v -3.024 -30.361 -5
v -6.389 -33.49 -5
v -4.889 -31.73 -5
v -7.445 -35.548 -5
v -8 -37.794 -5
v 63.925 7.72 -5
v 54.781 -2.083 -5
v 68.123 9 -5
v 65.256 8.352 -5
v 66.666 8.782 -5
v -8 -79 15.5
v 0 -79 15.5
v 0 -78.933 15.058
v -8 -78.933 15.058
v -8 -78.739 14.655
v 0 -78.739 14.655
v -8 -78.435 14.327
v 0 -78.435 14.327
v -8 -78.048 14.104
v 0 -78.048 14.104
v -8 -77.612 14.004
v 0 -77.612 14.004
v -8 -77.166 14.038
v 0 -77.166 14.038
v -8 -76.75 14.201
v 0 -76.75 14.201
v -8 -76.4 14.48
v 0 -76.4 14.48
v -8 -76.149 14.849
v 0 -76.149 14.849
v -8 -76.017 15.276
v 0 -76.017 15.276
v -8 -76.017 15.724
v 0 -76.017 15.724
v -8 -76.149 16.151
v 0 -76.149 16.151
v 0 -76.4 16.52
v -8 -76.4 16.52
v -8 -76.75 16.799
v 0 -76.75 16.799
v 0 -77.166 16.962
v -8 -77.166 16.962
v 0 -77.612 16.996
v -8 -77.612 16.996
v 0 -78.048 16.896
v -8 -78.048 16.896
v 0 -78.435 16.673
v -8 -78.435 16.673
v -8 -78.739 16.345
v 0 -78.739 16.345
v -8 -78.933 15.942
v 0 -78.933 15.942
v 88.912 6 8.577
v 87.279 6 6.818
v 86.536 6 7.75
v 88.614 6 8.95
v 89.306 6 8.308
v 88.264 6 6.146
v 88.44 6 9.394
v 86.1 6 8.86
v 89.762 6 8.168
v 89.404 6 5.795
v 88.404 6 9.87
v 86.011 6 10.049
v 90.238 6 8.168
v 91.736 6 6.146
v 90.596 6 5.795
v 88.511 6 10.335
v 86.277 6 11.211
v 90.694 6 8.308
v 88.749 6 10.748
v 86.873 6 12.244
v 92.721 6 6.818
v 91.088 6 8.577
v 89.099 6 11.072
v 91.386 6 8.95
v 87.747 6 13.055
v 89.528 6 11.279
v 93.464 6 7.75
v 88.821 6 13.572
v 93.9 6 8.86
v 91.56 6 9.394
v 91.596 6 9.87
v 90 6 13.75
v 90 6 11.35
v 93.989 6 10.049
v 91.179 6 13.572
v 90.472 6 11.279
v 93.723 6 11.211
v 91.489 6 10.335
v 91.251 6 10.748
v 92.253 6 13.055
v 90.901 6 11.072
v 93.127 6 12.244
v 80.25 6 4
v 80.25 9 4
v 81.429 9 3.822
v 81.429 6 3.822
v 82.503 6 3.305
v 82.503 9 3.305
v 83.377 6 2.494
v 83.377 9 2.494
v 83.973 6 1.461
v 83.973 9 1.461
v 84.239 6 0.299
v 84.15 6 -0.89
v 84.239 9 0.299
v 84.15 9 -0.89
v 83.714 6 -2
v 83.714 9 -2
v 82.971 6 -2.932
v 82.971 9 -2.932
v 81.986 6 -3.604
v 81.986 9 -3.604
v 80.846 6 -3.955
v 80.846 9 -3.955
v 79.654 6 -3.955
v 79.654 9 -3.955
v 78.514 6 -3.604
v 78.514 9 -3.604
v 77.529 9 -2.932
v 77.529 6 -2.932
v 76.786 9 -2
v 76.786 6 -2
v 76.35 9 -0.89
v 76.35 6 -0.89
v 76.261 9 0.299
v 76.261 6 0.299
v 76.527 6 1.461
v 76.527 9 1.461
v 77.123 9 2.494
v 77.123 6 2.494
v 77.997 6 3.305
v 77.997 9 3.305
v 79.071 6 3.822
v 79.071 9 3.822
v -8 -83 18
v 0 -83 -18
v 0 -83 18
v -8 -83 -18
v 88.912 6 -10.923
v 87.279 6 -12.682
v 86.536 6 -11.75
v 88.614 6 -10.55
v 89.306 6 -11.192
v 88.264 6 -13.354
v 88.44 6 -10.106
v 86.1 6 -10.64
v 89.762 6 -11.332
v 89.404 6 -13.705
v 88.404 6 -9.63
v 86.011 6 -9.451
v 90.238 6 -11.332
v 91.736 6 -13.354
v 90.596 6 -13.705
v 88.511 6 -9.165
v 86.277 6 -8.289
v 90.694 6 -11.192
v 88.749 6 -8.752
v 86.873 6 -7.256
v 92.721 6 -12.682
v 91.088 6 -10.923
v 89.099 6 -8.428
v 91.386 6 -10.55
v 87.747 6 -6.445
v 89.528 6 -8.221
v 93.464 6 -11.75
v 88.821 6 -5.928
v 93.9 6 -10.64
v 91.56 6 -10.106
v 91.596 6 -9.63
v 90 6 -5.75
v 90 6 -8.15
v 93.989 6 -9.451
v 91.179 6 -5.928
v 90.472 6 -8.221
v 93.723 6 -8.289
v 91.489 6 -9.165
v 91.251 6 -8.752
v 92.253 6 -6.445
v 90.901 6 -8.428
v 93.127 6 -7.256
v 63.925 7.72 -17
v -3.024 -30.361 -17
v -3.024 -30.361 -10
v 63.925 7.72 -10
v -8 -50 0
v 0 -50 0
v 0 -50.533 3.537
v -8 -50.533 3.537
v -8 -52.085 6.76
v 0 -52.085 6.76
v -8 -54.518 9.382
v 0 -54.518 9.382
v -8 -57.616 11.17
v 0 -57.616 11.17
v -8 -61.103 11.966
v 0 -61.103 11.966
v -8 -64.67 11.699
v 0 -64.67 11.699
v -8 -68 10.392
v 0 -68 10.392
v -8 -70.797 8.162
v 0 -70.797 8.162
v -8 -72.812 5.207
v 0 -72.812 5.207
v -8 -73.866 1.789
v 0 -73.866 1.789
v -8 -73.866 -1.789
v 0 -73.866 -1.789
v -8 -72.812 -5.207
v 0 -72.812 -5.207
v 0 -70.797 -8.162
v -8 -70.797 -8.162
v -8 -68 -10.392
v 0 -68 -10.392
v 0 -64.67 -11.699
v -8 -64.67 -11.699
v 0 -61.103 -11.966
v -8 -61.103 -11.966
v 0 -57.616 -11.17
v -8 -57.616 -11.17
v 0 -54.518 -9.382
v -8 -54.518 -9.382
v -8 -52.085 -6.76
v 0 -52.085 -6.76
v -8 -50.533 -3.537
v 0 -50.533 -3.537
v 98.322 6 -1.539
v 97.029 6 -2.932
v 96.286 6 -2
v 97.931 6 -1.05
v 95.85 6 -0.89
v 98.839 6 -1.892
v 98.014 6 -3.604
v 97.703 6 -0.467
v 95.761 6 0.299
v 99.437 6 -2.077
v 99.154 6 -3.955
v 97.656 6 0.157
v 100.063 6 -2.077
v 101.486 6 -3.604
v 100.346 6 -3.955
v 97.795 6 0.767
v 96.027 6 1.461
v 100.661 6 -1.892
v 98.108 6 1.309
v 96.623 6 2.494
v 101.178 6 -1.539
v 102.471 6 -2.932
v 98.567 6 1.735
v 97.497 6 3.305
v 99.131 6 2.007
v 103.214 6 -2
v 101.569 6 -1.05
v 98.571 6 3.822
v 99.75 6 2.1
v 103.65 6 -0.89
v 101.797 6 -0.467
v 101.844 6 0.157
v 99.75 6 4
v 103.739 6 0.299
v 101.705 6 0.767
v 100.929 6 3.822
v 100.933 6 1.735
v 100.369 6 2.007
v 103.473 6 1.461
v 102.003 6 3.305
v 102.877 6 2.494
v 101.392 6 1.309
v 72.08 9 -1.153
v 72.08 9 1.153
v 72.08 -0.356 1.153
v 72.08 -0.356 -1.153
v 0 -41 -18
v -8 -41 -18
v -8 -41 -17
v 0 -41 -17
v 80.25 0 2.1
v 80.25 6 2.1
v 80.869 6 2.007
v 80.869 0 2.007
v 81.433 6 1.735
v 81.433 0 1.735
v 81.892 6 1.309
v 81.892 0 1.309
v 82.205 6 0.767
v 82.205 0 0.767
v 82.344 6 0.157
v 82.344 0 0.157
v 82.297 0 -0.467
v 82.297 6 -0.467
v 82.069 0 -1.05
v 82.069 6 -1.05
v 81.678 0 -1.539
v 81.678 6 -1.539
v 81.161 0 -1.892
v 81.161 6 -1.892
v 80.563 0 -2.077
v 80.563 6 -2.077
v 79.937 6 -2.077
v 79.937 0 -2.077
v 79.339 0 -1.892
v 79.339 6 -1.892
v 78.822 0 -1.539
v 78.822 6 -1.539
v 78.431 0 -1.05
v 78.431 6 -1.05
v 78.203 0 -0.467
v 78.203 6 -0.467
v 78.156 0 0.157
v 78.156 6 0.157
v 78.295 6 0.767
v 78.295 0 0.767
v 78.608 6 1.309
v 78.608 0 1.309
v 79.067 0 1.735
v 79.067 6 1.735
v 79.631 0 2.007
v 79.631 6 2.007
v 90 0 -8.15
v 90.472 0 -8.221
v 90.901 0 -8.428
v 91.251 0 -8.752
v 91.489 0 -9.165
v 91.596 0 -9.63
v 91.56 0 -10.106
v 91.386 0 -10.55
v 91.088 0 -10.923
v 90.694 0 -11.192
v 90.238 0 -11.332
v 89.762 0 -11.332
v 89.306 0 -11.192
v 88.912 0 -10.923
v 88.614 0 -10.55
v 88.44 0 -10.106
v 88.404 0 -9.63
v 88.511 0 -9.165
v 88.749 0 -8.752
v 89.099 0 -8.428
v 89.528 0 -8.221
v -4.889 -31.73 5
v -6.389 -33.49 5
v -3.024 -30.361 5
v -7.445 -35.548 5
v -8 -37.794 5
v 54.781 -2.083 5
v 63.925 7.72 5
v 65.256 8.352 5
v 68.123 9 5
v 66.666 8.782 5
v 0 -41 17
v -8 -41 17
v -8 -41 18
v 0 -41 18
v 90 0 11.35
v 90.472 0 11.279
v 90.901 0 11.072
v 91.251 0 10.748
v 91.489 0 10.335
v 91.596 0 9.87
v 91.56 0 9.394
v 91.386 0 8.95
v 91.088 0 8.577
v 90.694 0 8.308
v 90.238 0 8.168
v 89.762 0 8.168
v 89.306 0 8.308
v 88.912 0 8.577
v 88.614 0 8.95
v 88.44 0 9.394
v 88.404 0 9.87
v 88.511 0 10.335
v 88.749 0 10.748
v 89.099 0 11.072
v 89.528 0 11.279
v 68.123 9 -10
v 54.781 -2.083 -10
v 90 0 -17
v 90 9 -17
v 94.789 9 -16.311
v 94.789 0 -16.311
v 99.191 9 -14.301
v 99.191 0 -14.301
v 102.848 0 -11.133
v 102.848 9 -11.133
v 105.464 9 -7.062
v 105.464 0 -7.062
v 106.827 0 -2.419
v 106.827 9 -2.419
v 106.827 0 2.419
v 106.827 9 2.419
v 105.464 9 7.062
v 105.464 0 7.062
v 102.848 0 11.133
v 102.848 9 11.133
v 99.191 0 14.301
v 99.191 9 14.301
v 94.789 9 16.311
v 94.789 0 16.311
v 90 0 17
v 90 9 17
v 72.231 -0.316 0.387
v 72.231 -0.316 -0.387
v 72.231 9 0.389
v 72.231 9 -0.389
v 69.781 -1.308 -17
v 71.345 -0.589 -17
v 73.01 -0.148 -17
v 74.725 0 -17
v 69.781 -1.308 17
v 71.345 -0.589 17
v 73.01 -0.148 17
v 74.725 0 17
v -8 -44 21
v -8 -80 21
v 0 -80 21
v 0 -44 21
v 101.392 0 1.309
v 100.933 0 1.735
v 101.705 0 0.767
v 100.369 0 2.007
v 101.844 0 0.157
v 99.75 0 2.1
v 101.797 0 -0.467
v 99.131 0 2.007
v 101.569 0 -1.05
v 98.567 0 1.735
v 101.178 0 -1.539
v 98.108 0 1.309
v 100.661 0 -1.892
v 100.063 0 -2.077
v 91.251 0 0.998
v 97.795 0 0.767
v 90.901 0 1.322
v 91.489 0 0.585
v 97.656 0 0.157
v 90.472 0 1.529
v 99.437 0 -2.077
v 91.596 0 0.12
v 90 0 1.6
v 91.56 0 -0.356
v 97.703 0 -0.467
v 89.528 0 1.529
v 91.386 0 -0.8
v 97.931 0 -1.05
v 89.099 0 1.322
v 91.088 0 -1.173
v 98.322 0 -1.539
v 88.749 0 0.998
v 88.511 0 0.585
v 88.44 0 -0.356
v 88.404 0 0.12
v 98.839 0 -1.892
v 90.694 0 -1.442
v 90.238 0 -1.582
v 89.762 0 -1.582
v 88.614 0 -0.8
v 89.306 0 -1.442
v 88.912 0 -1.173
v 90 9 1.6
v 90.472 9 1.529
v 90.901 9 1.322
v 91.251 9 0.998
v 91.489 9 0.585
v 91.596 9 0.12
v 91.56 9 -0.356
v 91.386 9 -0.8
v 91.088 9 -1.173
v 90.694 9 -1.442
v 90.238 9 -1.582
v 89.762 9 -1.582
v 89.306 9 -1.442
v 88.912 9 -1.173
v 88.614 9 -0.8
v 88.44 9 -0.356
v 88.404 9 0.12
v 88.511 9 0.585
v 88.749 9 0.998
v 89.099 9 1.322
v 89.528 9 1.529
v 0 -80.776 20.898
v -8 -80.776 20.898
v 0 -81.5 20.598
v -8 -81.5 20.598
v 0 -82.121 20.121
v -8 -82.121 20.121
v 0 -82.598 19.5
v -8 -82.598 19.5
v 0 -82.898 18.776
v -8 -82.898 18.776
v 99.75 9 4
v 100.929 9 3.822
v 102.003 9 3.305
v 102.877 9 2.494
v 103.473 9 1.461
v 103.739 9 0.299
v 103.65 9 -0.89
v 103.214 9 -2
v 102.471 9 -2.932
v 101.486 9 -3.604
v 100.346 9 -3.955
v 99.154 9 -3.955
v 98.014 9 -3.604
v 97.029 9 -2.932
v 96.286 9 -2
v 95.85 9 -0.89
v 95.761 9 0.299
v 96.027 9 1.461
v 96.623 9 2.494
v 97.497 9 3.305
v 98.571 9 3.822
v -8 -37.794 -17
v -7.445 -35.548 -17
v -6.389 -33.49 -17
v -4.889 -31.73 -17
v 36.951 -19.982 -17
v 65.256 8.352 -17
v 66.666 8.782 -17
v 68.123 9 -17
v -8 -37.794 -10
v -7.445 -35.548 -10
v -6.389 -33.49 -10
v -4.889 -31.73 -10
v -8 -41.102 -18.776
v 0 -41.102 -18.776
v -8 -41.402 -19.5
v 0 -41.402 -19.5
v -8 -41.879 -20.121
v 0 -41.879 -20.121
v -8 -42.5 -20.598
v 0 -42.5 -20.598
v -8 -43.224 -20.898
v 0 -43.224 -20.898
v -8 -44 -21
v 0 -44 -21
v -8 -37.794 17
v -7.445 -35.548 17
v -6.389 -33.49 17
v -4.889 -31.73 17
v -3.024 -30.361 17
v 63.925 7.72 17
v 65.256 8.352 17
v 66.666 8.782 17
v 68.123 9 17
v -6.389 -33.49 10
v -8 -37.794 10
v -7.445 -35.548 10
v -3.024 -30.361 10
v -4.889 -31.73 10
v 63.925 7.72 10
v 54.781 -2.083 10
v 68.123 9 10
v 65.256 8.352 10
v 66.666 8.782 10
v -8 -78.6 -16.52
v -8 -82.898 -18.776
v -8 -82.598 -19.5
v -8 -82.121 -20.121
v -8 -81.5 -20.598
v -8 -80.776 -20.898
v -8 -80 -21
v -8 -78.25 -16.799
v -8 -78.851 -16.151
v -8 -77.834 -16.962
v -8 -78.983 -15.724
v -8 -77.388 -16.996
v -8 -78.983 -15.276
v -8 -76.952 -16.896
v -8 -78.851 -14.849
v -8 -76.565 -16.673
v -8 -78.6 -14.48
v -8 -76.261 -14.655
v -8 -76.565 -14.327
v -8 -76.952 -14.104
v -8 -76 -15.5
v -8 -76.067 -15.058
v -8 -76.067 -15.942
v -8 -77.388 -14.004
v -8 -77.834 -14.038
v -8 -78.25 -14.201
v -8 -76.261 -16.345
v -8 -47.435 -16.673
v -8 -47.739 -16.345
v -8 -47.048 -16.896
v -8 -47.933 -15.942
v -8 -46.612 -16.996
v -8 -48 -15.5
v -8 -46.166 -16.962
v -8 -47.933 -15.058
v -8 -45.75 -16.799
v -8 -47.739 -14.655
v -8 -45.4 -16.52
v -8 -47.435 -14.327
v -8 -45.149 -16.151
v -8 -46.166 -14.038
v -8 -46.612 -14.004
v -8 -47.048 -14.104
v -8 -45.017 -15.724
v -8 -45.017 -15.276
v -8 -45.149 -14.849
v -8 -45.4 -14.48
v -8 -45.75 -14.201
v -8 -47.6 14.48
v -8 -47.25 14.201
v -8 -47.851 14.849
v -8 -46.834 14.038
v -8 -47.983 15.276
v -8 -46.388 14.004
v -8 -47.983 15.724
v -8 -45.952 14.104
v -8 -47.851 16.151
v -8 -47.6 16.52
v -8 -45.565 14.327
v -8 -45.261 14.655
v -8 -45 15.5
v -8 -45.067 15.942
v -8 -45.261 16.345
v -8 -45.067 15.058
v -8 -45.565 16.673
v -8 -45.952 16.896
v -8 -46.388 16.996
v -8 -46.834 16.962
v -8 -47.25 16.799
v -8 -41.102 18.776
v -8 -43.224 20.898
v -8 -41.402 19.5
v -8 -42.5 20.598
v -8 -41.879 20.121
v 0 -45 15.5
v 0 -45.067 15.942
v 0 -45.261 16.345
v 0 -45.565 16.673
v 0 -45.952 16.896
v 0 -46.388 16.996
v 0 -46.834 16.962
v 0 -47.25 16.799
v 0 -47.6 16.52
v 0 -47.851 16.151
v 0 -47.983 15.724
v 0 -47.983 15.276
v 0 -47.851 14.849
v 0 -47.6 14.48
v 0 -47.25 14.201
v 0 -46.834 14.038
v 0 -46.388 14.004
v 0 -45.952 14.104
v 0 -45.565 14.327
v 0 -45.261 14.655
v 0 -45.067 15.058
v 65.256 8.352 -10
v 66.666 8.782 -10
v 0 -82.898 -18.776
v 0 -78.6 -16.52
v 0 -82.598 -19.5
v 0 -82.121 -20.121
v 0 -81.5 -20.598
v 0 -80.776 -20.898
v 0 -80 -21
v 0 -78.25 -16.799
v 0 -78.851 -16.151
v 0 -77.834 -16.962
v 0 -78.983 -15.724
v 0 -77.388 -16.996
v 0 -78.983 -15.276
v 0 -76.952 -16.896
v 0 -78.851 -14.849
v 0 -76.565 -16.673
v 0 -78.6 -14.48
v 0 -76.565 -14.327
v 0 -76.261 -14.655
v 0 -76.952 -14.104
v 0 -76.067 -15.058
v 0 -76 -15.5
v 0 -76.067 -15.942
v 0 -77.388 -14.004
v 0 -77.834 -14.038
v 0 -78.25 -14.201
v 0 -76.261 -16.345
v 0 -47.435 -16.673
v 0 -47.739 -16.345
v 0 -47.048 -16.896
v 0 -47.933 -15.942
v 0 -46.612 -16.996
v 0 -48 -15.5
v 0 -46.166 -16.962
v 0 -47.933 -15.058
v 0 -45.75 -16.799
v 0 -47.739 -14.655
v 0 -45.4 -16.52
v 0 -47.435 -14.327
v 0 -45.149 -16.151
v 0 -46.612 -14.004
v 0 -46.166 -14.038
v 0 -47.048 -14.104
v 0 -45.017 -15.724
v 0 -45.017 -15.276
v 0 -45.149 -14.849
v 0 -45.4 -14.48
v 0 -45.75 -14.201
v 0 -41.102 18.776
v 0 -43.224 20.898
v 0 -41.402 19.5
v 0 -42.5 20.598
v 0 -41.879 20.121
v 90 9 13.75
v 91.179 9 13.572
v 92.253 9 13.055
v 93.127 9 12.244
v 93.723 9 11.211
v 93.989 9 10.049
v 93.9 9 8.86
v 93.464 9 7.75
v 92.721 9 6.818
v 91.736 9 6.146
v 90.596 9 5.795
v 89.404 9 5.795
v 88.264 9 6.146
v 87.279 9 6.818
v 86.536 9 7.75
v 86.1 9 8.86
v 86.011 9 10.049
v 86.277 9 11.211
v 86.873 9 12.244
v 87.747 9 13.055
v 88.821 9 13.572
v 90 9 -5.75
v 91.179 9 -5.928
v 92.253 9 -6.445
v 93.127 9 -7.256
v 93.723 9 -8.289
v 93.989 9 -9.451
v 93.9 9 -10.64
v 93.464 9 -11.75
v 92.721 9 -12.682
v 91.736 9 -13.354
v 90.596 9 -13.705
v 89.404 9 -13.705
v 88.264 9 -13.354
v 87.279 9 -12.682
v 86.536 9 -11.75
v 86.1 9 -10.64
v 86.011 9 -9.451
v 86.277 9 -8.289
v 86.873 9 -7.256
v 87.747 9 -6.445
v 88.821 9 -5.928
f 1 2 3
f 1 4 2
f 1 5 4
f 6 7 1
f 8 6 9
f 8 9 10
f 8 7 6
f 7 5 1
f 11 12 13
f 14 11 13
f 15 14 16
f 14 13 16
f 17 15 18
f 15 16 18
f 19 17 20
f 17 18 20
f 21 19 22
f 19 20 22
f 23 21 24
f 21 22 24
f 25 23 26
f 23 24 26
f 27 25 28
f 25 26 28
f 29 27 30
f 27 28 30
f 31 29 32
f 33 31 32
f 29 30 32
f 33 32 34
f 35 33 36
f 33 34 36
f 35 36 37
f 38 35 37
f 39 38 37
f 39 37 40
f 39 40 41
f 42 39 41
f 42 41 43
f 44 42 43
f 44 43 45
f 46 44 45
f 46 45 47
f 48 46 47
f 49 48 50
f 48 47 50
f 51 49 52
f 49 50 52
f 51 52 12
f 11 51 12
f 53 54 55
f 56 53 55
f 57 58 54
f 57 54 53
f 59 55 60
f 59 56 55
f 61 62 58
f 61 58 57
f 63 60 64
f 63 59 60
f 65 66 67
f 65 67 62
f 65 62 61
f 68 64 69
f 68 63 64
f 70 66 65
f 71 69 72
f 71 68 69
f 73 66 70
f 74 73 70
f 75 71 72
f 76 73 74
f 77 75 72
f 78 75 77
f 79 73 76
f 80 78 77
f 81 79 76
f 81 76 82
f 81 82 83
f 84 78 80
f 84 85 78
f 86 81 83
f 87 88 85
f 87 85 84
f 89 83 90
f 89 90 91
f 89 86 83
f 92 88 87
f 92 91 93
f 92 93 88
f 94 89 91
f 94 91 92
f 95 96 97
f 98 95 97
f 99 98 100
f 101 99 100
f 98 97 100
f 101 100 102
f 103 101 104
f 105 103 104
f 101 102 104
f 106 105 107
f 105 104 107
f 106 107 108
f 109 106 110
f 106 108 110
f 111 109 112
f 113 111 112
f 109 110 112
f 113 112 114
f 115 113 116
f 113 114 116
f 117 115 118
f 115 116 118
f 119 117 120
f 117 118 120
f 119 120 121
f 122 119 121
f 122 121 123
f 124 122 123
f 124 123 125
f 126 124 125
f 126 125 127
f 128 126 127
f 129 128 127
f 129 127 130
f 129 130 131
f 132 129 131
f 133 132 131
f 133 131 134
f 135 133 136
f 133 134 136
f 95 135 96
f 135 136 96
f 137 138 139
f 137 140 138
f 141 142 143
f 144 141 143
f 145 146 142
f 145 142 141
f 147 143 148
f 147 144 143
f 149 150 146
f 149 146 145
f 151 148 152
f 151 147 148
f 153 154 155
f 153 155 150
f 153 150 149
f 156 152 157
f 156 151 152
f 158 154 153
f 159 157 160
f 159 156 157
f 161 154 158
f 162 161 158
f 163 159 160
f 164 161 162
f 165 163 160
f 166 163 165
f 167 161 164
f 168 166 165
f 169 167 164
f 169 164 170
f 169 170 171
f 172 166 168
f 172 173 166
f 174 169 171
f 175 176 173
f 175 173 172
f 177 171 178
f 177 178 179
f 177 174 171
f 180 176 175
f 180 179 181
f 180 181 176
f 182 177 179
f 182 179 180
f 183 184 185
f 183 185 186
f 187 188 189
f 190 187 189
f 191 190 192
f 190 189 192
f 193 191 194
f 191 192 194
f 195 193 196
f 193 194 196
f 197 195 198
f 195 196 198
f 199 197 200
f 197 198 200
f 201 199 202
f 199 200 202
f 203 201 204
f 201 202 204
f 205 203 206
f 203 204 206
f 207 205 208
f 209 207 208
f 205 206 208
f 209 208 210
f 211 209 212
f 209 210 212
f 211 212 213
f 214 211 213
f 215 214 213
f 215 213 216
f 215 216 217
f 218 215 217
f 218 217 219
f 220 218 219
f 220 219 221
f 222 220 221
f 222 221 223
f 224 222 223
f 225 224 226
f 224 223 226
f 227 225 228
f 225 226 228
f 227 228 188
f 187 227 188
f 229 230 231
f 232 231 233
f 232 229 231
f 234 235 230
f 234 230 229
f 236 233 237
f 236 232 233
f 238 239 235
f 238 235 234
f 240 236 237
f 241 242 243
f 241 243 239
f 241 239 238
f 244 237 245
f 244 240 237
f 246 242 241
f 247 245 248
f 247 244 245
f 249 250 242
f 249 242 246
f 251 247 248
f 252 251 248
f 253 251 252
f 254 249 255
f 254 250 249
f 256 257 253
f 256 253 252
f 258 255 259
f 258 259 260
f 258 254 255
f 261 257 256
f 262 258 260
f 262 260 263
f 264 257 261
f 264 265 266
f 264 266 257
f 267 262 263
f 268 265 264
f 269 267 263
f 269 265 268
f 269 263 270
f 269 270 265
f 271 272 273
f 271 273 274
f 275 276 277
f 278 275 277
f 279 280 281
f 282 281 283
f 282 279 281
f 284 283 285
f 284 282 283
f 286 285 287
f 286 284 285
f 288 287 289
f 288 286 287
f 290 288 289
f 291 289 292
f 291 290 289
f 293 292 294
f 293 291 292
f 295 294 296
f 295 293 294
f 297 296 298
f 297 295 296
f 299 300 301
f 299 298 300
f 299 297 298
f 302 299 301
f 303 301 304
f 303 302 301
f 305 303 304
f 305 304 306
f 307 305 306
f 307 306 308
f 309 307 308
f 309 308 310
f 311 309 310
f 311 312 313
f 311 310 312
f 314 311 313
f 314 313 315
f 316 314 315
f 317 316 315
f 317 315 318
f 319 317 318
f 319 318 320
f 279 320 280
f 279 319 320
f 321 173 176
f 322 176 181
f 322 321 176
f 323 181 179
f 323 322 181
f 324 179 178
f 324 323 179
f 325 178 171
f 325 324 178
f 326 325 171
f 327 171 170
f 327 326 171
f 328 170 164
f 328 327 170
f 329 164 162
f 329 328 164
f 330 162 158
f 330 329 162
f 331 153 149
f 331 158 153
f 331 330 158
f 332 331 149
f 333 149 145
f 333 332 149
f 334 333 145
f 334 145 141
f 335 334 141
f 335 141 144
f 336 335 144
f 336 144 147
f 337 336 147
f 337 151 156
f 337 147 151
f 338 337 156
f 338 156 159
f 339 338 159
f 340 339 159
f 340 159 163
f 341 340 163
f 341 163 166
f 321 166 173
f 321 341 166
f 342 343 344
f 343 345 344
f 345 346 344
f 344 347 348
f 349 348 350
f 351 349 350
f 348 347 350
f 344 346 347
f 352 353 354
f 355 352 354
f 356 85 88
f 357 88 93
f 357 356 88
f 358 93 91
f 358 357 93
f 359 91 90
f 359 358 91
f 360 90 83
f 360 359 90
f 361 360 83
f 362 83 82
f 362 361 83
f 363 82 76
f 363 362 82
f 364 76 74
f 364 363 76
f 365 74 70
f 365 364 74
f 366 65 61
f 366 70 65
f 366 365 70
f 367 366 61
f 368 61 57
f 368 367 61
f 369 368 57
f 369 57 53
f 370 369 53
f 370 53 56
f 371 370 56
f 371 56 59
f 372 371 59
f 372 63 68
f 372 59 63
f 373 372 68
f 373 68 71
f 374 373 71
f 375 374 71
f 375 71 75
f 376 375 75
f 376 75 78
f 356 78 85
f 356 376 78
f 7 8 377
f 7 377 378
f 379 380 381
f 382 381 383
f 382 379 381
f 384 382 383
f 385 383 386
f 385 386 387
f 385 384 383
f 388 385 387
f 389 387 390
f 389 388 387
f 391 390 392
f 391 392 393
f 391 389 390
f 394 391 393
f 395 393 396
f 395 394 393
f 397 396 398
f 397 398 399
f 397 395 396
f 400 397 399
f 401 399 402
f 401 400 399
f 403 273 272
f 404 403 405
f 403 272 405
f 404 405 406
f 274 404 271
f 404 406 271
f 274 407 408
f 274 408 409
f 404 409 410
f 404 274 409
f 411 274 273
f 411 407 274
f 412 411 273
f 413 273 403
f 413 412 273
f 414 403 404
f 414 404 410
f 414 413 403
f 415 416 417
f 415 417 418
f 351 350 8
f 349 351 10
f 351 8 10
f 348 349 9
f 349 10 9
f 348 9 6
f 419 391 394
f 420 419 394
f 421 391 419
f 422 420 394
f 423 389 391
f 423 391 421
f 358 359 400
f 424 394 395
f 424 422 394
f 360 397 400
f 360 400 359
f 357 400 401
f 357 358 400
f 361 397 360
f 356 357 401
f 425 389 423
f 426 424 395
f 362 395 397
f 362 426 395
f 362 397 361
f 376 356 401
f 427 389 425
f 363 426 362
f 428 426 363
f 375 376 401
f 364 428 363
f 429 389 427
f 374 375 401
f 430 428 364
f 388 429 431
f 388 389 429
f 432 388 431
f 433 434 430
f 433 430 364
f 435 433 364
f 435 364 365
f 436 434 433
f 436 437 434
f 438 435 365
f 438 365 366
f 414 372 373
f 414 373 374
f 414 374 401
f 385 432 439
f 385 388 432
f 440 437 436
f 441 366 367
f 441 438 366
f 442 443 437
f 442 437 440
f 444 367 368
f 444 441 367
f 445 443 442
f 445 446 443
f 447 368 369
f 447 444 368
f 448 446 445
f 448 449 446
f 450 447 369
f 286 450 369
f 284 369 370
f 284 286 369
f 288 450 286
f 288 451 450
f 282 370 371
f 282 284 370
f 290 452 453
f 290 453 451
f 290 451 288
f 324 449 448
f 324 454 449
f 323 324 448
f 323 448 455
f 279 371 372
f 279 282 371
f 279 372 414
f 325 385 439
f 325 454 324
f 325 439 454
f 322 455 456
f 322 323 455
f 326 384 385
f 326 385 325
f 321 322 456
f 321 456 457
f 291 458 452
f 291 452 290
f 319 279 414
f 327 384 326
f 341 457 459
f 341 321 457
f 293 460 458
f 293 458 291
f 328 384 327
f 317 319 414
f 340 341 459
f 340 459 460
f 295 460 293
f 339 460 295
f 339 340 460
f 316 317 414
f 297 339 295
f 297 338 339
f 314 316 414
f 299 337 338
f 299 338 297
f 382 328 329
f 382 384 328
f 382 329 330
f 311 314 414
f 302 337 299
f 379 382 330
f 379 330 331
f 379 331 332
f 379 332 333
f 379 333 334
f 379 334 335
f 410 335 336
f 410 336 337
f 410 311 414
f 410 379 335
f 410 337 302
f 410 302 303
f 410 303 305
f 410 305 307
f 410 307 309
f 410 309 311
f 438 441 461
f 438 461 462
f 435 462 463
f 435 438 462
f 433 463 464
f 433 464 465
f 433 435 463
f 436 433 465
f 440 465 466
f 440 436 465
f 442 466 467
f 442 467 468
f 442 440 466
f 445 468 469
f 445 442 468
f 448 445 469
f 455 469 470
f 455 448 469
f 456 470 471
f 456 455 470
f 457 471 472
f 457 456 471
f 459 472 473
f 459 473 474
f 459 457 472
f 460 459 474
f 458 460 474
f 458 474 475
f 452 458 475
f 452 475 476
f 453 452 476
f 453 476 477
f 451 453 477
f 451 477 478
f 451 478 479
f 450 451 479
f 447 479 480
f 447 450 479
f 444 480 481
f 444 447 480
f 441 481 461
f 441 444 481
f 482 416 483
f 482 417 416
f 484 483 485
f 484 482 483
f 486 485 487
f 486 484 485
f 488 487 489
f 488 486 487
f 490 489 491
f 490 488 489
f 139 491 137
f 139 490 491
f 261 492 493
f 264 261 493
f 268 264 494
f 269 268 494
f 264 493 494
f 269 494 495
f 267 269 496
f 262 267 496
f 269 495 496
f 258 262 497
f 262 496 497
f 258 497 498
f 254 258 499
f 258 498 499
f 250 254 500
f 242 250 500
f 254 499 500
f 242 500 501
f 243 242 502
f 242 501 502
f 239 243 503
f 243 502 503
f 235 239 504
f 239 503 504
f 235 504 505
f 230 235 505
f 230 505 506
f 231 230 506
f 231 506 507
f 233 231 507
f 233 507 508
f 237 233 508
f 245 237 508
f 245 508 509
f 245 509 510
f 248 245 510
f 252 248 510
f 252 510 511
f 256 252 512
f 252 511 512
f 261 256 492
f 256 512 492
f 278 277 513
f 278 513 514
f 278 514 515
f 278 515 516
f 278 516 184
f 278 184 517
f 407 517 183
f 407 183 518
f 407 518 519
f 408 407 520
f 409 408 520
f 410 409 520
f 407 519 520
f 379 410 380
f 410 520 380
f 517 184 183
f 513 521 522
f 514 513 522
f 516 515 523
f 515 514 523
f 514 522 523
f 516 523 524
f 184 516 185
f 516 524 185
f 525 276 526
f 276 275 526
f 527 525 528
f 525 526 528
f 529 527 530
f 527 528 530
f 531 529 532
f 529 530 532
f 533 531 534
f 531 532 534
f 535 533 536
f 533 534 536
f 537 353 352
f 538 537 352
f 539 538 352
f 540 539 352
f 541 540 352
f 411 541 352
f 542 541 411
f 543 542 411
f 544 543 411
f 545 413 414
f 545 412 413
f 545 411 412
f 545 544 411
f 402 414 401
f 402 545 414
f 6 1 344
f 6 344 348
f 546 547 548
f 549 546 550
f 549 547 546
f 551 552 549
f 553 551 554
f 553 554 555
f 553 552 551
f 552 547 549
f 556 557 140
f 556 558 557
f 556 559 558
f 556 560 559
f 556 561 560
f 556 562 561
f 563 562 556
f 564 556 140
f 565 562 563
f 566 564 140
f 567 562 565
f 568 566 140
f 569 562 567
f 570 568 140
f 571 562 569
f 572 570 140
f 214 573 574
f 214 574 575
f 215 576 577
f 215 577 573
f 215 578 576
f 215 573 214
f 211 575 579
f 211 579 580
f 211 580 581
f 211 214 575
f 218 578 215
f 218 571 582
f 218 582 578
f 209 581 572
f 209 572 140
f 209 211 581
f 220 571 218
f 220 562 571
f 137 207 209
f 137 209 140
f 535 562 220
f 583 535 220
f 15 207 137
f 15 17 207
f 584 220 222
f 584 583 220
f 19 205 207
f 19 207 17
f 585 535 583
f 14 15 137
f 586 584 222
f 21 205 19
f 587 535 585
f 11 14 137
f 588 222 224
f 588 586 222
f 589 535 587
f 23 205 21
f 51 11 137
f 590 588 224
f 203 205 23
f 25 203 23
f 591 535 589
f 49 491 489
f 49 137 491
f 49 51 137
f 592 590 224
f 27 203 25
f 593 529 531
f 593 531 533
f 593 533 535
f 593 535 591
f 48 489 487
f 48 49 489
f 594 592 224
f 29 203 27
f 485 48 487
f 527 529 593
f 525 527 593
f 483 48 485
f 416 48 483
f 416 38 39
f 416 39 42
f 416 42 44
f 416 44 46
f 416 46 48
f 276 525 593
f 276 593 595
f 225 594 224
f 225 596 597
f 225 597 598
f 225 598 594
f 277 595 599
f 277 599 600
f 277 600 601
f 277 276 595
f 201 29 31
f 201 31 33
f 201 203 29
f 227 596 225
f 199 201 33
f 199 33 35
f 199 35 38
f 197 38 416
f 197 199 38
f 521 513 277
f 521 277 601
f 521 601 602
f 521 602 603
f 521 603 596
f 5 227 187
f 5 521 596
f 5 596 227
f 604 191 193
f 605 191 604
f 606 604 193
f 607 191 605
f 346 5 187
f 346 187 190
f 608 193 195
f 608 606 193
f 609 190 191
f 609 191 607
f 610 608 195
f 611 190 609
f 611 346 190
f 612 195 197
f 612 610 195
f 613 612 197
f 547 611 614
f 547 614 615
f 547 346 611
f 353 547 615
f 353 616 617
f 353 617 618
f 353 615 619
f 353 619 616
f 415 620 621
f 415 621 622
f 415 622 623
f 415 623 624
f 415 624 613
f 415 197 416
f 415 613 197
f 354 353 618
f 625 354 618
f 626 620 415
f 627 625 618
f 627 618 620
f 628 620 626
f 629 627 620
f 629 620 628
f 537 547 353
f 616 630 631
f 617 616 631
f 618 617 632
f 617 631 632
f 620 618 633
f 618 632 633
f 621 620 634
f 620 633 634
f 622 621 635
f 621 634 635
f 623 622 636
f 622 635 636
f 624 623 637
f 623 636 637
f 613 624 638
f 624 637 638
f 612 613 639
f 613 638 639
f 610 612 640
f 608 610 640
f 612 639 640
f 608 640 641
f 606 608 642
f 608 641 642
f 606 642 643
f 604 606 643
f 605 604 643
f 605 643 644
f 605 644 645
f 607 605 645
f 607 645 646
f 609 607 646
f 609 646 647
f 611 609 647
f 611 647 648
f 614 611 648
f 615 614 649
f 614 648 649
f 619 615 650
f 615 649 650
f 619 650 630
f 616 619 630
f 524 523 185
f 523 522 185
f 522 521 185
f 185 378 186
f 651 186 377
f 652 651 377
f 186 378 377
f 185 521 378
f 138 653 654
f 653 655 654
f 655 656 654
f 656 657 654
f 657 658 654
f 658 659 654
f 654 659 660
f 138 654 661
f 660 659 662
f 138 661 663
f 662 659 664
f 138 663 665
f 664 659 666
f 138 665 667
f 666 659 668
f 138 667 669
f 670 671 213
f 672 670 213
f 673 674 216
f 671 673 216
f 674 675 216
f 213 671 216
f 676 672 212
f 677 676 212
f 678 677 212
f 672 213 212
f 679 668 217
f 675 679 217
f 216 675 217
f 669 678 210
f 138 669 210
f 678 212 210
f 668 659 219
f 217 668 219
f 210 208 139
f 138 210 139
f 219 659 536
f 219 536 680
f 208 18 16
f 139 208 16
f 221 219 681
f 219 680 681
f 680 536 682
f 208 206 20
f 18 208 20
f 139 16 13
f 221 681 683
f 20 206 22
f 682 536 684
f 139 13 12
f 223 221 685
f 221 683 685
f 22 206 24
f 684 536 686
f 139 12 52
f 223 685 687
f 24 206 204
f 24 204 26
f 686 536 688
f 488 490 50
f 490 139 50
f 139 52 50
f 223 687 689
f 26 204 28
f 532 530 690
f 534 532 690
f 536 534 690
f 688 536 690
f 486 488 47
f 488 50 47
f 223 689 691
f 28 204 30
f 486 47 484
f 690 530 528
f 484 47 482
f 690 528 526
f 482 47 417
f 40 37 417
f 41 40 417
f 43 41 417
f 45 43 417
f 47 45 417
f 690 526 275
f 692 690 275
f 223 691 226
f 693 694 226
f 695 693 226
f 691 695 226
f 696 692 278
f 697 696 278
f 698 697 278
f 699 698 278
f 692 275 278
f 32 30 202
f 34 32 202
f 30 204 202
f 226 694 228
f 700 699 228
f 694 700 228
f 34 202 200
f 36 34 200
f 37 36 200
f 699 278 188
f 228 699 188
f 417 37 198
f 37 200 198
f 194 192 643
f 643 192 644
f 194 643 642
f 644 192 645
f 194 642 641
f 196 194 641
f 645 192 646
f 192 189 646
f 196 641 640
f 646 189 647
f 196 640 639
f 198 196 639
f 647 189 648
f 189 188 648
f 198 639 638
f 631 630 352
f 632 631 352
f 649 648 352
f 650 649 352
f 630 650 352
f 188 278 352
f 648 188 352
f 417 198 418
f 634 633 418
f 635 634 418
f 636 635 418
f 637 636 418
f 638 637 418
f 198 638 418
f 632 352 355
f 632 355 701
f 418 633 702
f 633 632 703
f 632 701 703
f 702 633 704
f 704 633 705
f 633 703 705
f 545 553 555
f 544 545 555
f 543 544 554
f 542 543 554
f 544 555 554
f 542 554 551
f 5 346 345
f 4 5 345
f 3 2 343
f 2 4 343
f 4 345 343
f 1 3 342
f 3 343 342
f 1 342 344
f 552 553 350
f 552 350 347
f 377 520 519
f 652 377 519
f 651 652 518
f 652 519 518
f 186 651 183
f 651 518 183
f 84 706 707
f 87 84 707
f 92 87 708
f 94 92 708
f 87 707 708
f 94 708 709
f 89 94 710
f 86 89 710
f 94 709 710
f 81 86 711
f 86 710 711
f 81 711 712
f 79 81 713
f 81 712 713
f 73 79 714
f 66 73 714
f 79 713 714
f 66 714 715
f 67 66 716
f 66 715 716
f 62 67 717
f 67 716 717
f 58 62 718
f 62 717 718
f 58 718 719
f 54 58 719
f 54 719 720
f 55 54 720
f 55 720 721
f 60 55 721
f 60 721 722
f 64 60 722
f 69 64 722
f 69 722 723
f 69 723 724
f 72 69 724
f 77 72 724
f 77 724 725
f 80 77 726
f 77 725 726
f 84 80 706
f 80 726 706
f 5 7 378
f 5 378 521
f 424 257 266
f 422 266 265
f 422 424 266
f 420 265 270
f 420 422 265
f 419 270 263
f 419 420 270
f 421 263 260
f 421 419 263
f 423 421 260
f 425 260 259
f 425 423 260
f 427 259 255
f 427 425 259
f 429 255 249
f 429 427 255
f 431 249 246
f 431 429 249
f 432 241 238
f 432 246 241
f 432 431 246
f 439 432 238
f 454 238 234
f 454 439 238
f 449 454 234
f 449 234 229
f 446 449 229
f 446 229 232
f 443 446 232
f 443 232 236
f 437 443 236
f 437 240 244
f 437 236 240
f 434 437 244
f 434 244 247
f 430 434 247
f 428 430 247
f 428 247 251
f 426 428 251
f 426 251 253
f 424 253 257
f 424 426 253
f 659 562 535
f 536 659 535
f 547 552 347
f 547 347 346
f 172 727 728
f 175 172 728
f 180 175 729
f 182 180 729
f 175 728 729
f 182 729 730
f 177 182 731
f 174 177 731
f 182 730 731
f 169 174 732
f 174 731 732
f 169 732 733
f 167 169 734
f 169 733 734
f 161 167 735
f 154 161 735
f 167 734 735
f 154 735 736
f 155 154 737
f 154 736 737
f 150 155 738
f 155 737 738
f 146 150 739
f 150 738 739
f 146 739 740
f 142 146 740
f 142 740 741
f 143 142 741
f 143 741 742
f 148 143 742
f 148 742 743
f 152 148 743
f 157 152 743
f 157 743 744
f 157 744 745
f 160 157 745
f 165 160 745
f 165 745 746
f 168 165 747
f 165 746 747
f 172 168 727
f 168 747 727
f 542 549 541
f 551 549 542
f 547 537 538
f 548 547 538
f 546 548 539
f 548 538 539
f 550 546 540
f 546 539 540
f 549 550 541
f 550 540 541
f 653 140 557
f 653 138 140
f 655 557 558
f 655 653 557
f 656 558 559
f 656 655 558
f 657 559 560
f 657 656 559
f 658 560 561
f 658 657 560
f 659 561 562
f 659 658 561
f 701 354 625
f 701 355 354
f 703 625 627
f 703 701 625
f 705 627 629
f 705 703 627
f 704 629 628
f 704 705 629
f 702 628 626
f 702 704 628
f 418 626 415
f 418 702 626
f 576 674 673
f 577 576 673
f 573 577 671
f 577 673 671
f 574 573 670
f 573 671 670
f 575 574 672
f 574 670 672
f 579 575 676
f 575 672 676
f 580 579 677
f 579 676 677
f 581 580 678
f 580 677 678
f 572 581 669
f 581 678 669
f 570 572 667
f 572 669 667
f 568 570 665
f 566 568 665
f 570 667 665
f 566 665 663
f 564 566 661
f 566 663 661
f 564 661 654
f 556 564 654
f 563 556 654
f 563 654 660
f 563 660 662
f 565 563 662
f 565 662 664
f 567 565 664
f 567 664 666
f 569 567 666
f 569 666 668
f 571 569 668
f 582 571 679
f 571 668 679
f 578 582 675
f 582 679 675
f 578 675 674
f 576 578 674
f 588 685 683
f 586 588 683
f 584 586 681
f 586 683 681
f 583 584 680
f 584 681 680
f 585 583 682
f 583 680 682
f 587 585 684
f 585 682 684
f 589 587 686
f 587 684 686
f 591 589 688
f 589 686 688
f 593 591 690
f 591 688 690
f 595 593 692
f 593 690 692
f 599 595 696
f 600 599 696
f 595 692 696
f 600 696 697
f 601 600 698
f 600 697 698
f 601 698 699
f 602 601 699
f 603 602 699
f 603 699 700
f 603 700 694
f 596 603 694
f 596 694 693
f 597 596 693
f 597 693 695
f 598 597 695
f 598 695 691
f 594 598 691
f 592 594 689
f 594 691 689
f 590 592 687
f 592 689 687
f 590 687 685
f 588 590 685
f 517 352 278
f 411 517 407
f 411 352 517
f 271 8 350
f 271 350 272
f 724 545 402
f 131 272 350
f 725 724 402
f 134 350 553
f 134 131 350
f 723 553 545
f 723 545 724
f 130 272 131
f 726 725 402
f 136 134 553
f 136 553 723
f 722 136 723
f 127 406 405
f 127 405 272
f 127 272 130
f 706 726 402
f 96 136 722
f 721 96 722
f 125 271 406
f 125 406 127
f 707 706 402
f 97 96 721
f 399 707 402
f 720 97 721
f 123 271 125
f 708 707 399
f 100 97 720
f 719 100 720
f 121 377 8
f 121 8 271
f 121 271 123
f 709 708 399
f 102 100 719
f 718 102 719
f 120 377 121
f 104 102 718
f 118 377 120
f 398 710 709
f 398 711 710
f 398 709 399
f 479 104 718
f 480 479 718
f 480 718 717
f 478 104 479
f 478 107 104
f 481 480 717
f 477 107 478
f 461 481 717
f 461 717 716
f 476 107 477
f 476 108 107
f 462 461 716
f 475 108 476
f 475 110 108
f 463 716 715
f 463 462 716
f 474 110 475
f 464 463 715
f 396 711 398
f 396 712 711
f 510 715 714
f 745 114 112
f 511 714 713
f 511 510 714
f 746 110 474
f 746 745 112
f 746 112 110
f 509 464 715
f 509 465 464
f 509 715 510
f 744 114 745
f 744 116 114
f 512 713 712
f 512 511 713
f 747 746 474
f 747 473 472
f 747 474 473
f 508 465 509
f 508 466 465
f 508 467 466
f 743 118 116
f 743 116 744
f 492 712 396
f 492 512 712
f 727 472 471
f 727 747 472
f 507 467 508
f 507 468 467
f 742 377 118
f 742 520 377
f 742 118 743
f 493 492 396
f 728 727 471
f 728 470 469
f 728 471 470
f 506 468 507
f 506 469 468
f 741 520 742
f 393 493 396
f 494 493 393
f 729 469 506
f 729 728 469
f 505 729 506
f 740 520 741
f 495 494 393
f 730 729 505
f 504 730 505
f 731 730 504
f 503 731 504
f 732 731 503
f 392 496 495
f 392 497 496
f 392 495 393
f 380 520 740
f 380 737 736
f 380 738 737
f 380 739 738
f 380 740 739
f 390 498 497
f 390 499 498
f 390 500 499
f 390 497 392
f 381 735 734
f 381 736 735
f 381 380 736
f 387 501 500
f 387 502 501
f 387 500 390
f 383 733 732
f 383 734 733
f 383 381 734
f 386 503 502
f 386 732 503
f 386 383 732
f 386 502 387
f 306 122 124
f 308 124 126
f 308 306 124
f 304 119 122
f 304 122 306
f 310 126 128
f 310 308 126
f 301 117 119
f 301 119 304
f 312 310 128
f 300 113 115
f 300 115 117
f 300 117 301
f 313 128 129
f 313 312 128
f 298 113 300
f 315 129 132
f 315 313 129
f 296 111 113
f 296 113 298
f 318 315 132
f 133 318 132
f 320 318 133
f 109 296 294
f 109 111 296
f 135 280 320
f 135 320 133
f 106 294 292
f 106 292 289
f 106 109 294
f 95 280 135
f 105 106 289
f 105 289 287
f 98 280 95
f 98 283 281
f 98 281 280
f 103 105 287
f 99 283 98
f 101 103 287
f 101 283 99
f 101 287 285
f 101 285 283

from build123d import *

# Parameters (mm, degrees)
SKETCH_1_R           = 1.6
SKETCH_1_R_2         = 2.1
EXTRUDE_2_DEPTH      = 9
SKETCH_3_R           = 4
CUT_EXTRUDE_2_DEPTH  = 3
SKETCH_4_W           = 22.834782432
SKETCH_4_H           = 34.021608207
CUT_EXTRUDE_3_DEPTH  = 10
SKETCH_5_W           = 8
SKETCH_5_H           = 34
SKETCH_5_R           = 1.6
EXTRUDE_3_DEPTH      = 6
SKETCH_6_R           = 3.5
CUT_EXTRUDE_4_DEPTH  = 3
CUT_EXTRUDE_5_DEPTH  = 13
EXTRUDE_4_DEPTH      = 35
CUT_EXTRUDE_6_DEPTH  = 40
SKETCH_10_W          = 118.393769374
SKETCH_10_H          = 1
CUT_EXTRUDE_7_DEPTH  = 40
SKETCH_11_W          = 80.430163382
SKETCH_11_H          = 7.146133908
CUT_EXTRUDE_8_DEPTH  = 40
EXTRUDE_5_DEPTH      = 34
SKETCH_14_W          = 42
SKETCH_14_H          = 42
EXTRUDE_6_DEPTH      = 8
SKETCH_13_R          = 1.5
SKETCH_13_R_2        = 12
CUT_EXTRUDE_10_DEPTH = 8
SKETCH_15_W          = 89.303663432
SKETCH_15_H          = 7
SKETCH_15_H_2        = 10
EXTRUDE_7_DEPTH      = 4
FILLET_1_R           = 10
FILLET_2_R           = 10
FILLET_3_R           = 3


with BuildPart() as part:
    # 草图1 → 凸台-拉伸2 (new body)
    with BuildSketch(Plane(origin=(0, 0, 0), x_dir=(1, 0, 0), z_dir=(0, 1, 0))):
        with BuildLine():
            Line((0, 17), (90, 17))
            ThreePointArc((90, 17), (107, 0), (90, -17))
            Line((90, -17), (0, -17))
            ThreePointArc((0, -17), (-17, 0), (0, 17))
        make_face()
        with Locations(Location((90, 0, 0), (0, 0, 270))):
            Circle(SKETCH_1_R, mode=Mode.SUBTRACT)
        with Locations(Location((90, 9.75, 0), (0, 0, 270))):
            Circle(SKETCH_1_R, mode=Mode.SUBTRACT)
        with Locations(Location((99.75, 0, 0), (0, 0, 270))):
            Circle(SKETCH_1_R_2, mode=Mode.SUBTRACT)
        with Locations(Location((90, -9.75, 0), (0, 0, 270))):
            Circle(SKETCH_1_R, mode=Mode.SUBTRACT)
        with Locations(Location((80.25, 0, 0), (0, 0, 270))):
            Circle(SKETCH_1_R_2, mode=Mode.SUBTRACT)
    extrude(amount=EXTRUDE_2_DEPTH)

    # 草图3 → 切除-拉伸2 (cut)
    with BuildSketch(Plane(origin=(0, 9, 0), x_dir=(1, 0, 0), z_dir=(0, 1, 0))):
        with Locations(Location((90, 9.75, 0), (0, 0, 270))):
            Circle(SKETCH_3_R)
        with Locations(Location((99.75, 0, 0), (0, 0, 270))):
            Circle(SKETCH_3_R)
        with Locations(Location((90, -9.75, 0), (0, 0, 270))):
            Circle(SKETCH_3_R)
        with Locations(Location((80.25, 0, 0), (0, 0, 270))):
            Circle(SKETCH_3_R)
    extrude(amount=-CUT_EXTRUDE_2_DEPTH, mode=Mode.SUBTRACT)

    # 草图4 → 切除-拉伸3 (cut)
    with BuildSketch(Plane(origin=(0, 9, 0), x_dir=(1, 0, 0), z_dir=(0, 1, 0))):
        with Locations((-11.417391216, 0.010804103)):
            Rectangle(SKETCH_4_W, SKETCH_4_H)
    extrude(amount=-CUT_EXTRUDE_3_DEPTH, mode=Mode.SUBTRACT)

    # 草图5 → 凸台-拉伸3 (add)
    with BuildSketch(Plane(origin=(0, 9, 0), x_dir=(1, 0, 0), z_dir=(0, 1, 0))):
        with Locations((-4, 0)):
            Rectangle(SKETCH_5_W, SKETCH_5_H)
        with Locations(Location((-4, 10, 0), (0, 0, 270))):
            Circle(SKETCH_5_R, mode=Mode.SUBTRACT)
        with Locations(Location((-4, 0, 0), (0, 0, 270))):
            Circle(SKETCH_5_R, mode=Mode.SUBTRACT)
        with Locations(Location((-4, -10, 0), (0, 0, 270))):
            Circle(SKETCH_5_R, mode=Mode.SUBTRACT)
    extrude(amount=-EXTRUDE_3_DEPTH)

    # 草图6 → 切除-拉伸4 (cut)
    with BuildSketch(Plane(origin=(0, 9, 0), x_dir=(1, 0, 0), z_dir=(0, 1, 0))):
        with Locations(Location((-4, 10, 0), (0, 0, 270))):
            Circle(SKETCH_6_R)
        with Locations(Location((-4, 0, 0), (0, 0, 270))):
            Circle(SKETCH_6_R)
        with Locations(Location((-4, -10, 0), (0, 0, 270))):
            Circle(SKETCH_6_R)
    extrude(amount=-CUT_EXTRUDE_4_DEPTH, mode=Mode.SUBTRACT)

    # 草图7 → 切除-拉伸5 (cut)
    with BuildSketch(Plane(origin=(0, 9, 0), x_dir=(1, 0, 0), z_dir=(0, 1, 0))):
        with BuildLine():
            Line((68.25, -4), (7, -4))
            ThreePointArc((7, -4), (3, 0), (7, 4))
            Line((7, 4), (68.25, 4))
            ThreePointArc((68.25, 4), (72.25, 0), (68.25, -4))
        make_face()
    extrude(amount=-CUT_EXTRUDE_5_DEPTH, mode=Mode.SUBTRACT)

    # 草图8 → 凸台-拉伸4 (add)
    with BuildSketch(Plane.XY.offset(17)):
        Polygon((0, -83), (0, -41), (72.080145507, 0), (58.442959142, 0), (-8, -37.793504795), (-8, -41), (-8, -83), align=None)
    extrude(amount=-EXTRUDE_4_DEPTH)

    # 草图9 → 切除-拉伸6 (cut)
    with BuildSketch(Plane.XY.offset(17)):
        Polygon((58.442959142, 0), (68.123155874, 9), (-8, 9), (-8, 0), align=None)
    extrude(amount=-CUT_EXTRUDE_6_DEPTH, mode=Mode.SUBTRACT)

    # 草图10 → 切除-拉伸7 (cut)
    with BuildSketch(Plane(origin=(27.096230432, -29.144093474, 0), x_dir=(0.7323691027025148, 0.6809078479550029, 0), z_dir=(-0.6809078479550029, 0.7323691027025148, 0))):
        with Locations((-3.177419515, 17.5)):
            Rectangle(SKETCH_10_W, SKETCH_10_H)
    extrude(amount=-CUT_EXTRUDE_7_DEPTH, mode=Mode.SUBTRACT)

    # 草图11 → 切除-拉伸8 (cut)
    with BuildSketch(Plane(origin=(17.620285002, -30.977383092, 0), x_dir=(0.8692214499653501, 0.49442296763007937, 0), z_dir=(0.49442296763007937, -0.8692214499653501, 0))):
        with Locations((12.899580295, -20.573066954)):
            Rectangle(SKETCH_11_W, SKETCH_11_H)
    extrude(amount=-CUT_EXTRUDE_8_DEPTH, mode=Mode.SUBTRACT)

    # 草图12 → 凸台-拉伸5 (add)
    with BuildSketch(Plane.XY.offset(17)):
        Polygon((72.080145507, 0), (72.080145507, 9), (68.123155874, 9), (54.780591243, -2.083196181), (58.114256966, -7.94395497), align=None)
    extrude(amount=-EXTRUDE_5_DEPTH)

    # 草图14 → 凸台-拉伸6 (add)
    with BuildSketch(Plane.ZY.offset(8)):
        with Locations((0, -62)):
            Rectangle(SKETCH_14_W, SKETCH_14_H)
    extrude(amount=-EXTRUDE_6_DEPTH)

    # 草图13 → 切除-拉伸10 (cut)
    with BuildSketch(Plane(origin=(0, 0, 0), x_dir=(0, 0, -1), z_dir=(1, 0, 0))):
        with Locations(Location((-15.5, -46.5, 0), (0, 0, 90))):
            Circle(SKETCH_13_R)
        with Locations(Location((15.5, -46.5, 0), (0, 0, 270))):
            Circle(SKETCH_13_R)
        with Locations(Location((15.5, -77.5, 0), (0, 0, 90))):
            Circle(SKETCH_13_R)
        with Locations(Location((-15.5, -77.5, 0), (0, 0, 270))):
            Circle(SKETCH_13_R)
        with Locations(Location((0, -62, 0), (0, 0, 90))):
            Circle(SKETCH_13_R_2)
    extrude(amount=-CUT_EXTRUDE_10_DEPTH, mode=Mode.SUBTRACT)

    # 草图15 → 凸台-拉伸7 (add)
    with BuildSketch(Plane(origin=(14.286619279, -25.116624303, 0), x_dir=(0.86922144996535, 0.4944229676300795, 0), z_dir=(-0.4944229676300795, 0.86922144996535, 0))):
        with Locations((19.012083318, 13.5)):
            Rectangle(SKETCH_15_W, SKETCH_15_H)
        with Locations((19.012083318, 0)):
            Rectangle(SKETCH_15_W, SKETCH_15_H_2)
        with Locations((19.012083318, -13.5)):
            Rectangle(SKETCH_15_W, SKETCH_15_H)
    extrude(amount=EXTRUDE_7_DEPTH)

    # 圆角1
    # the kernel refuses this fillet: 10 mm, written as the material it takes off along each edge
    with BuildSketch(Plane(origin=(67.646967944, 9.837163299, -27.704780935), x_dir=(-0.8692214499653496, -0.4944229676300802, 0), z_dir=(0, 0, 1))) as fillet_1_piece_1:
        with BuildLine():
            CenterArc((4.281912374, 10), FILLET_1_R, 244.647173819, 25.352826181)
            Line((0, 0.963118546), (-0.085638247, 0.782380917))
            ThreePointArc((-0.085638247, 0.782380917), (-0.2, 0.481559273), (-0.2, 0))
            Line((-0.2, 0), (0, -0.2))
            Line((0, -0.2), (4.281912374, -0.2))
            Line((4.281912374, -0.2), (4.281912374, 0))
        make_face()
    extrude(amount=28.40956187, mode=Mode.SUBTRACT)
    with BuildSketch(Plane(origin=(67.646967944, 9.837163299, -15.704780935), x_dir=(-0.8692214499653494, -0.4944229676300803, 0), z_dir=(0, 0, 1))) as fillet_1_piece_2:
        with BuildLine():
            CenterArc((4.281912374, 10), FILLET_1_R, 244.647173819, 25.352826181)
            Line((0, 0.963118546), (-0.085638247, 0.782380917))
            ThreePointArc((-0.085638247, 0.782380917), (-0.2, 0.481559273), (-0.2, 0))
            Line((-0.2, 0), (0, -0.2))
            Line((0, -0.2), (4.281912374, -0.2))
            Line((4.281912374, -0.2), (4.281912374, 0))
        make_face()
    extrude(amount=31.40956187, mode=Mode.SUBTRACT)
    with BuildSketch(Plane(origin=(67.646967944, 9.837163299, 27.704780935), x_dir=(-0.8692214499653496, -0.4944229676300802, 0), z_dir=(0, 0, -1))) as fillet_1_piece_3:
        with BuildLine():
            CenterArc((4.281912374, -10), FILLET_1_R, 90, 25.352826181)
            Line((0, -0.963118546), (-0.085638247, -0.782380917))
            ThreePointArc((-0.085638247, -0.782380917), (-0.2, -0.481559273), (-0.2, 0))
            Line((-0.2, 0), (0, 0.2))
            Line((0, 0.2), (4.281912374, 0.2))
            Line((4.281912374, 0.2), (4.281912374, 0))
        make_face()
    extrude(amount=28.40956187, mode=Mode.SUBTRACT)
    with BuildSketch(Plane(origin=(-9.977691871, -34.316618995, 10), x_dir=(0.49442296763008015, -0.8692214499653496, 0), z_dir=(0, 0, -1))) as fillet_1_piece_4:
        with BuildLine():
            CenterArc((10, -8), FILLET_1_R, 126.869897646, 53.130102354)
            Line((0, -8), (-0.2, -8))
            Line((-0.2, -8), (-0.2, 0))
            Line((-0.2, 0), (0, 0.2))
            ThreePointArc((0, 0.2), (2, 0.2), (3.88, 0.16))
            Line((3.88, 0.16), (4, 0))
        make_face()
    extrude(amount=47, mode=Mode.SUBTRACT)
    with BuildSketch(Plane(origin=(-9.977691871, -34.316618995, 25), x_dir=(0.4944229676300804, -0.8692214499653496, 0), z_dir=(0, 0, -1))) as fillet_1_piece_5:
        with BuildLine():
            CenterArc((10, -8), FILLET_1_R, 126.869897646, 53.130102354)
            Line((0, -8), (-0.2, -8))
            Line((-0.2, -8), (-0.2, 0))
            Line((-0.2, 0), (0, 0.2))
            ThreePointArc((0, 0.2), (2, 0.2), (3.88, 0.16))
            Line((3.88, 0.16), (4, 0))
        make_face()
    extrude(amount=50, mode=Mode.SUBTRACT)
    with BuildSketch(Plane(origin=(-9.977691871, -34.316618995, -10), x_dir=(0.49442296763008015, -0.8692214499653496, 0), z_dir=(0, 0, 1))) as fillet_1_piece_6:
        with BuildLine():
            CenterArc((10, 8), FILLET_1_R, 180, 53.130102354)
            Line((0, 8), (-0.2, 8))
            Line((-0.2, 8), (-0.2, 0))
            Line((-0.2, 0), (0, -0.2))
            ThreePointArc((0, -0.2), (2, -0.2), (3.88, -0.16))
            Line((3.88, -0.16), (4, 0))
        make_face()
    extrude(amount=47, mode=Mode.SUBTRACT)

    # 圆角2
    # the kernel refuses this fillet: 10 mm, written as the material it adds along each edge
    with BuildSketch(Plane(origin=(72.080145507, 0, 17), x_dir=(-0.86922144996535, -0.4944229676300795, 0), z_dir=(0, 0, -1))) as fillet_2_piece_1_section:
        with BuildLine():
            CenterArc((FILLET_2_R * 0.264507433102, -FILLET_2_R), FILLET_2_R, 90, 29.631707367)
            Line((-FILLET_2_R * 0.229915534528, -FILLET_2_R * 0.130778550035), (0, 0))
            Line((0, 0), (FILLET_2_R * 0.264507433102, 0))
        make_face()
    fillet_2_piece_1 = extrude(amount=22.459435899, mode=Mode.PRIVATE)
    fillet_2_piece_1 = split(fillet_2_piece_1, bisect_by=Plane(origin=(72.080145507, -0.43196412, 9.594144242), z_dir=(-1, 0, 0)), keep=Keep.TOP, mode=Mode.PRIVATE)
    add(fillet_2_piece_1)
    with BuildSketch(Plane(origin=(72.080145507, 0, 17), x_dir=(-0.86922144996535, -0.4944229676300795, 0), z_dir=(0, 0, -1))) as fillet_2_piece_2_section:
        with BuildLine():
            CenterArc((FILLET_2_R * 0.264507433102, -FILLET_2_R), FILLET_2_R, 90, 29.631707367)
            Line((-FILLET_2_R * 0.229915534528, -FILLET_2_R * 0.130778550035), (0, 0))
            Line((0, 0), (FILLET_2_R * 0.264507433102, 0))
        make_face()
    fillet_2_piece_2 = extrude(amount=22.459435899, mode=Mode.PRIVATE)
    fillet_2_piece_2 = fillet_2_piece_2 - Plane(origin=(68.25, -0.105711956, 0), x_dir=(0, 0, -1), z_dir=(0, 1, 0)) * Cylinder(4, 56, mode=Mode.PRIVATE)
    add(fillet_2_piece_2)
    with BuildSketch(Plane(origin=(72.080145507, 0, 5.459435899), x_dir=(-0.86922144996535, -0.4944229676300795, 0), z_dir=(0, 0, -1))) as fillet_2_piece_3_section:
        with BuildLine():
            CenterArc((FILLET_2_R * 0.264507433102, -FILLET_2_R), FILLET_2_R, 90, 29.631707367)
            Line((-FILLET_2_R * 0.229915534528, -FILLET_2_R * 0.130778550035), (0, 0))
            Line((0, 0), (FILLET_2_R * 0.264507433102, 0))
        make_face()
    fillet_2_piece_3 = extrude(amount=22.459435899, mode=Mode.PRIVATE)
    fillet_2_piece_3 = split(fillet_2_piece_3, bisect_by=Plane(origin=(72.080145507, -0.402309052, 3.779769442), z_dir=(-1, 0, 0)), keep=Keep.TOP, mode=Mode.PRIVATE)
    add(fillet_2_piece_3)
    with BuildSketch(Plane(origin=(72.080145507, 0, 5.459435899), x_dir=(-0.86922144996535, -0.4944229676300795, 0), z_dir=(0, 0, -1))) as fillet_2_piece_4_section:
        with BuildLine():
            CenterArc((FILLET_2_R * 0.264507433102, -FILLET_2_R), FILLET_2_R, 90, 29.631707367)
            Line((-FILLET_2_R * 0.229915534528, -FILLET_2_R * 0.130778550035), (0, 0))
            Line((0, 0), (FILLET_2_R * 0.264507433102, 0))
        make_face()
    fillet_2_piece_4 = extrude(amount=22.459435899, mode=Mode.PRIVATE)
    fillet_2_piece_4 = fillet_2_piece_4 - Plane(origin=(68.25, -0.105711956, 0), x_dir=(0, 0, -1), z_dir=(0, 1, 0)) * Cylinder(4, 56, mode=Mode.PRIVATE)
    add(fillet_2_piece_4)

    # 圆角3
    fillet_3_edges = [part.edges().sort_by_distance(p)[0] for p in [
        (-4, -83, 21),
        (-4, -41, 21),
        (-4, -83, -21),
        (-4, -41, -21),
    ]]
    fillet(fillet_3_edges, radius=FILLET_3_R)


solid = part.part
